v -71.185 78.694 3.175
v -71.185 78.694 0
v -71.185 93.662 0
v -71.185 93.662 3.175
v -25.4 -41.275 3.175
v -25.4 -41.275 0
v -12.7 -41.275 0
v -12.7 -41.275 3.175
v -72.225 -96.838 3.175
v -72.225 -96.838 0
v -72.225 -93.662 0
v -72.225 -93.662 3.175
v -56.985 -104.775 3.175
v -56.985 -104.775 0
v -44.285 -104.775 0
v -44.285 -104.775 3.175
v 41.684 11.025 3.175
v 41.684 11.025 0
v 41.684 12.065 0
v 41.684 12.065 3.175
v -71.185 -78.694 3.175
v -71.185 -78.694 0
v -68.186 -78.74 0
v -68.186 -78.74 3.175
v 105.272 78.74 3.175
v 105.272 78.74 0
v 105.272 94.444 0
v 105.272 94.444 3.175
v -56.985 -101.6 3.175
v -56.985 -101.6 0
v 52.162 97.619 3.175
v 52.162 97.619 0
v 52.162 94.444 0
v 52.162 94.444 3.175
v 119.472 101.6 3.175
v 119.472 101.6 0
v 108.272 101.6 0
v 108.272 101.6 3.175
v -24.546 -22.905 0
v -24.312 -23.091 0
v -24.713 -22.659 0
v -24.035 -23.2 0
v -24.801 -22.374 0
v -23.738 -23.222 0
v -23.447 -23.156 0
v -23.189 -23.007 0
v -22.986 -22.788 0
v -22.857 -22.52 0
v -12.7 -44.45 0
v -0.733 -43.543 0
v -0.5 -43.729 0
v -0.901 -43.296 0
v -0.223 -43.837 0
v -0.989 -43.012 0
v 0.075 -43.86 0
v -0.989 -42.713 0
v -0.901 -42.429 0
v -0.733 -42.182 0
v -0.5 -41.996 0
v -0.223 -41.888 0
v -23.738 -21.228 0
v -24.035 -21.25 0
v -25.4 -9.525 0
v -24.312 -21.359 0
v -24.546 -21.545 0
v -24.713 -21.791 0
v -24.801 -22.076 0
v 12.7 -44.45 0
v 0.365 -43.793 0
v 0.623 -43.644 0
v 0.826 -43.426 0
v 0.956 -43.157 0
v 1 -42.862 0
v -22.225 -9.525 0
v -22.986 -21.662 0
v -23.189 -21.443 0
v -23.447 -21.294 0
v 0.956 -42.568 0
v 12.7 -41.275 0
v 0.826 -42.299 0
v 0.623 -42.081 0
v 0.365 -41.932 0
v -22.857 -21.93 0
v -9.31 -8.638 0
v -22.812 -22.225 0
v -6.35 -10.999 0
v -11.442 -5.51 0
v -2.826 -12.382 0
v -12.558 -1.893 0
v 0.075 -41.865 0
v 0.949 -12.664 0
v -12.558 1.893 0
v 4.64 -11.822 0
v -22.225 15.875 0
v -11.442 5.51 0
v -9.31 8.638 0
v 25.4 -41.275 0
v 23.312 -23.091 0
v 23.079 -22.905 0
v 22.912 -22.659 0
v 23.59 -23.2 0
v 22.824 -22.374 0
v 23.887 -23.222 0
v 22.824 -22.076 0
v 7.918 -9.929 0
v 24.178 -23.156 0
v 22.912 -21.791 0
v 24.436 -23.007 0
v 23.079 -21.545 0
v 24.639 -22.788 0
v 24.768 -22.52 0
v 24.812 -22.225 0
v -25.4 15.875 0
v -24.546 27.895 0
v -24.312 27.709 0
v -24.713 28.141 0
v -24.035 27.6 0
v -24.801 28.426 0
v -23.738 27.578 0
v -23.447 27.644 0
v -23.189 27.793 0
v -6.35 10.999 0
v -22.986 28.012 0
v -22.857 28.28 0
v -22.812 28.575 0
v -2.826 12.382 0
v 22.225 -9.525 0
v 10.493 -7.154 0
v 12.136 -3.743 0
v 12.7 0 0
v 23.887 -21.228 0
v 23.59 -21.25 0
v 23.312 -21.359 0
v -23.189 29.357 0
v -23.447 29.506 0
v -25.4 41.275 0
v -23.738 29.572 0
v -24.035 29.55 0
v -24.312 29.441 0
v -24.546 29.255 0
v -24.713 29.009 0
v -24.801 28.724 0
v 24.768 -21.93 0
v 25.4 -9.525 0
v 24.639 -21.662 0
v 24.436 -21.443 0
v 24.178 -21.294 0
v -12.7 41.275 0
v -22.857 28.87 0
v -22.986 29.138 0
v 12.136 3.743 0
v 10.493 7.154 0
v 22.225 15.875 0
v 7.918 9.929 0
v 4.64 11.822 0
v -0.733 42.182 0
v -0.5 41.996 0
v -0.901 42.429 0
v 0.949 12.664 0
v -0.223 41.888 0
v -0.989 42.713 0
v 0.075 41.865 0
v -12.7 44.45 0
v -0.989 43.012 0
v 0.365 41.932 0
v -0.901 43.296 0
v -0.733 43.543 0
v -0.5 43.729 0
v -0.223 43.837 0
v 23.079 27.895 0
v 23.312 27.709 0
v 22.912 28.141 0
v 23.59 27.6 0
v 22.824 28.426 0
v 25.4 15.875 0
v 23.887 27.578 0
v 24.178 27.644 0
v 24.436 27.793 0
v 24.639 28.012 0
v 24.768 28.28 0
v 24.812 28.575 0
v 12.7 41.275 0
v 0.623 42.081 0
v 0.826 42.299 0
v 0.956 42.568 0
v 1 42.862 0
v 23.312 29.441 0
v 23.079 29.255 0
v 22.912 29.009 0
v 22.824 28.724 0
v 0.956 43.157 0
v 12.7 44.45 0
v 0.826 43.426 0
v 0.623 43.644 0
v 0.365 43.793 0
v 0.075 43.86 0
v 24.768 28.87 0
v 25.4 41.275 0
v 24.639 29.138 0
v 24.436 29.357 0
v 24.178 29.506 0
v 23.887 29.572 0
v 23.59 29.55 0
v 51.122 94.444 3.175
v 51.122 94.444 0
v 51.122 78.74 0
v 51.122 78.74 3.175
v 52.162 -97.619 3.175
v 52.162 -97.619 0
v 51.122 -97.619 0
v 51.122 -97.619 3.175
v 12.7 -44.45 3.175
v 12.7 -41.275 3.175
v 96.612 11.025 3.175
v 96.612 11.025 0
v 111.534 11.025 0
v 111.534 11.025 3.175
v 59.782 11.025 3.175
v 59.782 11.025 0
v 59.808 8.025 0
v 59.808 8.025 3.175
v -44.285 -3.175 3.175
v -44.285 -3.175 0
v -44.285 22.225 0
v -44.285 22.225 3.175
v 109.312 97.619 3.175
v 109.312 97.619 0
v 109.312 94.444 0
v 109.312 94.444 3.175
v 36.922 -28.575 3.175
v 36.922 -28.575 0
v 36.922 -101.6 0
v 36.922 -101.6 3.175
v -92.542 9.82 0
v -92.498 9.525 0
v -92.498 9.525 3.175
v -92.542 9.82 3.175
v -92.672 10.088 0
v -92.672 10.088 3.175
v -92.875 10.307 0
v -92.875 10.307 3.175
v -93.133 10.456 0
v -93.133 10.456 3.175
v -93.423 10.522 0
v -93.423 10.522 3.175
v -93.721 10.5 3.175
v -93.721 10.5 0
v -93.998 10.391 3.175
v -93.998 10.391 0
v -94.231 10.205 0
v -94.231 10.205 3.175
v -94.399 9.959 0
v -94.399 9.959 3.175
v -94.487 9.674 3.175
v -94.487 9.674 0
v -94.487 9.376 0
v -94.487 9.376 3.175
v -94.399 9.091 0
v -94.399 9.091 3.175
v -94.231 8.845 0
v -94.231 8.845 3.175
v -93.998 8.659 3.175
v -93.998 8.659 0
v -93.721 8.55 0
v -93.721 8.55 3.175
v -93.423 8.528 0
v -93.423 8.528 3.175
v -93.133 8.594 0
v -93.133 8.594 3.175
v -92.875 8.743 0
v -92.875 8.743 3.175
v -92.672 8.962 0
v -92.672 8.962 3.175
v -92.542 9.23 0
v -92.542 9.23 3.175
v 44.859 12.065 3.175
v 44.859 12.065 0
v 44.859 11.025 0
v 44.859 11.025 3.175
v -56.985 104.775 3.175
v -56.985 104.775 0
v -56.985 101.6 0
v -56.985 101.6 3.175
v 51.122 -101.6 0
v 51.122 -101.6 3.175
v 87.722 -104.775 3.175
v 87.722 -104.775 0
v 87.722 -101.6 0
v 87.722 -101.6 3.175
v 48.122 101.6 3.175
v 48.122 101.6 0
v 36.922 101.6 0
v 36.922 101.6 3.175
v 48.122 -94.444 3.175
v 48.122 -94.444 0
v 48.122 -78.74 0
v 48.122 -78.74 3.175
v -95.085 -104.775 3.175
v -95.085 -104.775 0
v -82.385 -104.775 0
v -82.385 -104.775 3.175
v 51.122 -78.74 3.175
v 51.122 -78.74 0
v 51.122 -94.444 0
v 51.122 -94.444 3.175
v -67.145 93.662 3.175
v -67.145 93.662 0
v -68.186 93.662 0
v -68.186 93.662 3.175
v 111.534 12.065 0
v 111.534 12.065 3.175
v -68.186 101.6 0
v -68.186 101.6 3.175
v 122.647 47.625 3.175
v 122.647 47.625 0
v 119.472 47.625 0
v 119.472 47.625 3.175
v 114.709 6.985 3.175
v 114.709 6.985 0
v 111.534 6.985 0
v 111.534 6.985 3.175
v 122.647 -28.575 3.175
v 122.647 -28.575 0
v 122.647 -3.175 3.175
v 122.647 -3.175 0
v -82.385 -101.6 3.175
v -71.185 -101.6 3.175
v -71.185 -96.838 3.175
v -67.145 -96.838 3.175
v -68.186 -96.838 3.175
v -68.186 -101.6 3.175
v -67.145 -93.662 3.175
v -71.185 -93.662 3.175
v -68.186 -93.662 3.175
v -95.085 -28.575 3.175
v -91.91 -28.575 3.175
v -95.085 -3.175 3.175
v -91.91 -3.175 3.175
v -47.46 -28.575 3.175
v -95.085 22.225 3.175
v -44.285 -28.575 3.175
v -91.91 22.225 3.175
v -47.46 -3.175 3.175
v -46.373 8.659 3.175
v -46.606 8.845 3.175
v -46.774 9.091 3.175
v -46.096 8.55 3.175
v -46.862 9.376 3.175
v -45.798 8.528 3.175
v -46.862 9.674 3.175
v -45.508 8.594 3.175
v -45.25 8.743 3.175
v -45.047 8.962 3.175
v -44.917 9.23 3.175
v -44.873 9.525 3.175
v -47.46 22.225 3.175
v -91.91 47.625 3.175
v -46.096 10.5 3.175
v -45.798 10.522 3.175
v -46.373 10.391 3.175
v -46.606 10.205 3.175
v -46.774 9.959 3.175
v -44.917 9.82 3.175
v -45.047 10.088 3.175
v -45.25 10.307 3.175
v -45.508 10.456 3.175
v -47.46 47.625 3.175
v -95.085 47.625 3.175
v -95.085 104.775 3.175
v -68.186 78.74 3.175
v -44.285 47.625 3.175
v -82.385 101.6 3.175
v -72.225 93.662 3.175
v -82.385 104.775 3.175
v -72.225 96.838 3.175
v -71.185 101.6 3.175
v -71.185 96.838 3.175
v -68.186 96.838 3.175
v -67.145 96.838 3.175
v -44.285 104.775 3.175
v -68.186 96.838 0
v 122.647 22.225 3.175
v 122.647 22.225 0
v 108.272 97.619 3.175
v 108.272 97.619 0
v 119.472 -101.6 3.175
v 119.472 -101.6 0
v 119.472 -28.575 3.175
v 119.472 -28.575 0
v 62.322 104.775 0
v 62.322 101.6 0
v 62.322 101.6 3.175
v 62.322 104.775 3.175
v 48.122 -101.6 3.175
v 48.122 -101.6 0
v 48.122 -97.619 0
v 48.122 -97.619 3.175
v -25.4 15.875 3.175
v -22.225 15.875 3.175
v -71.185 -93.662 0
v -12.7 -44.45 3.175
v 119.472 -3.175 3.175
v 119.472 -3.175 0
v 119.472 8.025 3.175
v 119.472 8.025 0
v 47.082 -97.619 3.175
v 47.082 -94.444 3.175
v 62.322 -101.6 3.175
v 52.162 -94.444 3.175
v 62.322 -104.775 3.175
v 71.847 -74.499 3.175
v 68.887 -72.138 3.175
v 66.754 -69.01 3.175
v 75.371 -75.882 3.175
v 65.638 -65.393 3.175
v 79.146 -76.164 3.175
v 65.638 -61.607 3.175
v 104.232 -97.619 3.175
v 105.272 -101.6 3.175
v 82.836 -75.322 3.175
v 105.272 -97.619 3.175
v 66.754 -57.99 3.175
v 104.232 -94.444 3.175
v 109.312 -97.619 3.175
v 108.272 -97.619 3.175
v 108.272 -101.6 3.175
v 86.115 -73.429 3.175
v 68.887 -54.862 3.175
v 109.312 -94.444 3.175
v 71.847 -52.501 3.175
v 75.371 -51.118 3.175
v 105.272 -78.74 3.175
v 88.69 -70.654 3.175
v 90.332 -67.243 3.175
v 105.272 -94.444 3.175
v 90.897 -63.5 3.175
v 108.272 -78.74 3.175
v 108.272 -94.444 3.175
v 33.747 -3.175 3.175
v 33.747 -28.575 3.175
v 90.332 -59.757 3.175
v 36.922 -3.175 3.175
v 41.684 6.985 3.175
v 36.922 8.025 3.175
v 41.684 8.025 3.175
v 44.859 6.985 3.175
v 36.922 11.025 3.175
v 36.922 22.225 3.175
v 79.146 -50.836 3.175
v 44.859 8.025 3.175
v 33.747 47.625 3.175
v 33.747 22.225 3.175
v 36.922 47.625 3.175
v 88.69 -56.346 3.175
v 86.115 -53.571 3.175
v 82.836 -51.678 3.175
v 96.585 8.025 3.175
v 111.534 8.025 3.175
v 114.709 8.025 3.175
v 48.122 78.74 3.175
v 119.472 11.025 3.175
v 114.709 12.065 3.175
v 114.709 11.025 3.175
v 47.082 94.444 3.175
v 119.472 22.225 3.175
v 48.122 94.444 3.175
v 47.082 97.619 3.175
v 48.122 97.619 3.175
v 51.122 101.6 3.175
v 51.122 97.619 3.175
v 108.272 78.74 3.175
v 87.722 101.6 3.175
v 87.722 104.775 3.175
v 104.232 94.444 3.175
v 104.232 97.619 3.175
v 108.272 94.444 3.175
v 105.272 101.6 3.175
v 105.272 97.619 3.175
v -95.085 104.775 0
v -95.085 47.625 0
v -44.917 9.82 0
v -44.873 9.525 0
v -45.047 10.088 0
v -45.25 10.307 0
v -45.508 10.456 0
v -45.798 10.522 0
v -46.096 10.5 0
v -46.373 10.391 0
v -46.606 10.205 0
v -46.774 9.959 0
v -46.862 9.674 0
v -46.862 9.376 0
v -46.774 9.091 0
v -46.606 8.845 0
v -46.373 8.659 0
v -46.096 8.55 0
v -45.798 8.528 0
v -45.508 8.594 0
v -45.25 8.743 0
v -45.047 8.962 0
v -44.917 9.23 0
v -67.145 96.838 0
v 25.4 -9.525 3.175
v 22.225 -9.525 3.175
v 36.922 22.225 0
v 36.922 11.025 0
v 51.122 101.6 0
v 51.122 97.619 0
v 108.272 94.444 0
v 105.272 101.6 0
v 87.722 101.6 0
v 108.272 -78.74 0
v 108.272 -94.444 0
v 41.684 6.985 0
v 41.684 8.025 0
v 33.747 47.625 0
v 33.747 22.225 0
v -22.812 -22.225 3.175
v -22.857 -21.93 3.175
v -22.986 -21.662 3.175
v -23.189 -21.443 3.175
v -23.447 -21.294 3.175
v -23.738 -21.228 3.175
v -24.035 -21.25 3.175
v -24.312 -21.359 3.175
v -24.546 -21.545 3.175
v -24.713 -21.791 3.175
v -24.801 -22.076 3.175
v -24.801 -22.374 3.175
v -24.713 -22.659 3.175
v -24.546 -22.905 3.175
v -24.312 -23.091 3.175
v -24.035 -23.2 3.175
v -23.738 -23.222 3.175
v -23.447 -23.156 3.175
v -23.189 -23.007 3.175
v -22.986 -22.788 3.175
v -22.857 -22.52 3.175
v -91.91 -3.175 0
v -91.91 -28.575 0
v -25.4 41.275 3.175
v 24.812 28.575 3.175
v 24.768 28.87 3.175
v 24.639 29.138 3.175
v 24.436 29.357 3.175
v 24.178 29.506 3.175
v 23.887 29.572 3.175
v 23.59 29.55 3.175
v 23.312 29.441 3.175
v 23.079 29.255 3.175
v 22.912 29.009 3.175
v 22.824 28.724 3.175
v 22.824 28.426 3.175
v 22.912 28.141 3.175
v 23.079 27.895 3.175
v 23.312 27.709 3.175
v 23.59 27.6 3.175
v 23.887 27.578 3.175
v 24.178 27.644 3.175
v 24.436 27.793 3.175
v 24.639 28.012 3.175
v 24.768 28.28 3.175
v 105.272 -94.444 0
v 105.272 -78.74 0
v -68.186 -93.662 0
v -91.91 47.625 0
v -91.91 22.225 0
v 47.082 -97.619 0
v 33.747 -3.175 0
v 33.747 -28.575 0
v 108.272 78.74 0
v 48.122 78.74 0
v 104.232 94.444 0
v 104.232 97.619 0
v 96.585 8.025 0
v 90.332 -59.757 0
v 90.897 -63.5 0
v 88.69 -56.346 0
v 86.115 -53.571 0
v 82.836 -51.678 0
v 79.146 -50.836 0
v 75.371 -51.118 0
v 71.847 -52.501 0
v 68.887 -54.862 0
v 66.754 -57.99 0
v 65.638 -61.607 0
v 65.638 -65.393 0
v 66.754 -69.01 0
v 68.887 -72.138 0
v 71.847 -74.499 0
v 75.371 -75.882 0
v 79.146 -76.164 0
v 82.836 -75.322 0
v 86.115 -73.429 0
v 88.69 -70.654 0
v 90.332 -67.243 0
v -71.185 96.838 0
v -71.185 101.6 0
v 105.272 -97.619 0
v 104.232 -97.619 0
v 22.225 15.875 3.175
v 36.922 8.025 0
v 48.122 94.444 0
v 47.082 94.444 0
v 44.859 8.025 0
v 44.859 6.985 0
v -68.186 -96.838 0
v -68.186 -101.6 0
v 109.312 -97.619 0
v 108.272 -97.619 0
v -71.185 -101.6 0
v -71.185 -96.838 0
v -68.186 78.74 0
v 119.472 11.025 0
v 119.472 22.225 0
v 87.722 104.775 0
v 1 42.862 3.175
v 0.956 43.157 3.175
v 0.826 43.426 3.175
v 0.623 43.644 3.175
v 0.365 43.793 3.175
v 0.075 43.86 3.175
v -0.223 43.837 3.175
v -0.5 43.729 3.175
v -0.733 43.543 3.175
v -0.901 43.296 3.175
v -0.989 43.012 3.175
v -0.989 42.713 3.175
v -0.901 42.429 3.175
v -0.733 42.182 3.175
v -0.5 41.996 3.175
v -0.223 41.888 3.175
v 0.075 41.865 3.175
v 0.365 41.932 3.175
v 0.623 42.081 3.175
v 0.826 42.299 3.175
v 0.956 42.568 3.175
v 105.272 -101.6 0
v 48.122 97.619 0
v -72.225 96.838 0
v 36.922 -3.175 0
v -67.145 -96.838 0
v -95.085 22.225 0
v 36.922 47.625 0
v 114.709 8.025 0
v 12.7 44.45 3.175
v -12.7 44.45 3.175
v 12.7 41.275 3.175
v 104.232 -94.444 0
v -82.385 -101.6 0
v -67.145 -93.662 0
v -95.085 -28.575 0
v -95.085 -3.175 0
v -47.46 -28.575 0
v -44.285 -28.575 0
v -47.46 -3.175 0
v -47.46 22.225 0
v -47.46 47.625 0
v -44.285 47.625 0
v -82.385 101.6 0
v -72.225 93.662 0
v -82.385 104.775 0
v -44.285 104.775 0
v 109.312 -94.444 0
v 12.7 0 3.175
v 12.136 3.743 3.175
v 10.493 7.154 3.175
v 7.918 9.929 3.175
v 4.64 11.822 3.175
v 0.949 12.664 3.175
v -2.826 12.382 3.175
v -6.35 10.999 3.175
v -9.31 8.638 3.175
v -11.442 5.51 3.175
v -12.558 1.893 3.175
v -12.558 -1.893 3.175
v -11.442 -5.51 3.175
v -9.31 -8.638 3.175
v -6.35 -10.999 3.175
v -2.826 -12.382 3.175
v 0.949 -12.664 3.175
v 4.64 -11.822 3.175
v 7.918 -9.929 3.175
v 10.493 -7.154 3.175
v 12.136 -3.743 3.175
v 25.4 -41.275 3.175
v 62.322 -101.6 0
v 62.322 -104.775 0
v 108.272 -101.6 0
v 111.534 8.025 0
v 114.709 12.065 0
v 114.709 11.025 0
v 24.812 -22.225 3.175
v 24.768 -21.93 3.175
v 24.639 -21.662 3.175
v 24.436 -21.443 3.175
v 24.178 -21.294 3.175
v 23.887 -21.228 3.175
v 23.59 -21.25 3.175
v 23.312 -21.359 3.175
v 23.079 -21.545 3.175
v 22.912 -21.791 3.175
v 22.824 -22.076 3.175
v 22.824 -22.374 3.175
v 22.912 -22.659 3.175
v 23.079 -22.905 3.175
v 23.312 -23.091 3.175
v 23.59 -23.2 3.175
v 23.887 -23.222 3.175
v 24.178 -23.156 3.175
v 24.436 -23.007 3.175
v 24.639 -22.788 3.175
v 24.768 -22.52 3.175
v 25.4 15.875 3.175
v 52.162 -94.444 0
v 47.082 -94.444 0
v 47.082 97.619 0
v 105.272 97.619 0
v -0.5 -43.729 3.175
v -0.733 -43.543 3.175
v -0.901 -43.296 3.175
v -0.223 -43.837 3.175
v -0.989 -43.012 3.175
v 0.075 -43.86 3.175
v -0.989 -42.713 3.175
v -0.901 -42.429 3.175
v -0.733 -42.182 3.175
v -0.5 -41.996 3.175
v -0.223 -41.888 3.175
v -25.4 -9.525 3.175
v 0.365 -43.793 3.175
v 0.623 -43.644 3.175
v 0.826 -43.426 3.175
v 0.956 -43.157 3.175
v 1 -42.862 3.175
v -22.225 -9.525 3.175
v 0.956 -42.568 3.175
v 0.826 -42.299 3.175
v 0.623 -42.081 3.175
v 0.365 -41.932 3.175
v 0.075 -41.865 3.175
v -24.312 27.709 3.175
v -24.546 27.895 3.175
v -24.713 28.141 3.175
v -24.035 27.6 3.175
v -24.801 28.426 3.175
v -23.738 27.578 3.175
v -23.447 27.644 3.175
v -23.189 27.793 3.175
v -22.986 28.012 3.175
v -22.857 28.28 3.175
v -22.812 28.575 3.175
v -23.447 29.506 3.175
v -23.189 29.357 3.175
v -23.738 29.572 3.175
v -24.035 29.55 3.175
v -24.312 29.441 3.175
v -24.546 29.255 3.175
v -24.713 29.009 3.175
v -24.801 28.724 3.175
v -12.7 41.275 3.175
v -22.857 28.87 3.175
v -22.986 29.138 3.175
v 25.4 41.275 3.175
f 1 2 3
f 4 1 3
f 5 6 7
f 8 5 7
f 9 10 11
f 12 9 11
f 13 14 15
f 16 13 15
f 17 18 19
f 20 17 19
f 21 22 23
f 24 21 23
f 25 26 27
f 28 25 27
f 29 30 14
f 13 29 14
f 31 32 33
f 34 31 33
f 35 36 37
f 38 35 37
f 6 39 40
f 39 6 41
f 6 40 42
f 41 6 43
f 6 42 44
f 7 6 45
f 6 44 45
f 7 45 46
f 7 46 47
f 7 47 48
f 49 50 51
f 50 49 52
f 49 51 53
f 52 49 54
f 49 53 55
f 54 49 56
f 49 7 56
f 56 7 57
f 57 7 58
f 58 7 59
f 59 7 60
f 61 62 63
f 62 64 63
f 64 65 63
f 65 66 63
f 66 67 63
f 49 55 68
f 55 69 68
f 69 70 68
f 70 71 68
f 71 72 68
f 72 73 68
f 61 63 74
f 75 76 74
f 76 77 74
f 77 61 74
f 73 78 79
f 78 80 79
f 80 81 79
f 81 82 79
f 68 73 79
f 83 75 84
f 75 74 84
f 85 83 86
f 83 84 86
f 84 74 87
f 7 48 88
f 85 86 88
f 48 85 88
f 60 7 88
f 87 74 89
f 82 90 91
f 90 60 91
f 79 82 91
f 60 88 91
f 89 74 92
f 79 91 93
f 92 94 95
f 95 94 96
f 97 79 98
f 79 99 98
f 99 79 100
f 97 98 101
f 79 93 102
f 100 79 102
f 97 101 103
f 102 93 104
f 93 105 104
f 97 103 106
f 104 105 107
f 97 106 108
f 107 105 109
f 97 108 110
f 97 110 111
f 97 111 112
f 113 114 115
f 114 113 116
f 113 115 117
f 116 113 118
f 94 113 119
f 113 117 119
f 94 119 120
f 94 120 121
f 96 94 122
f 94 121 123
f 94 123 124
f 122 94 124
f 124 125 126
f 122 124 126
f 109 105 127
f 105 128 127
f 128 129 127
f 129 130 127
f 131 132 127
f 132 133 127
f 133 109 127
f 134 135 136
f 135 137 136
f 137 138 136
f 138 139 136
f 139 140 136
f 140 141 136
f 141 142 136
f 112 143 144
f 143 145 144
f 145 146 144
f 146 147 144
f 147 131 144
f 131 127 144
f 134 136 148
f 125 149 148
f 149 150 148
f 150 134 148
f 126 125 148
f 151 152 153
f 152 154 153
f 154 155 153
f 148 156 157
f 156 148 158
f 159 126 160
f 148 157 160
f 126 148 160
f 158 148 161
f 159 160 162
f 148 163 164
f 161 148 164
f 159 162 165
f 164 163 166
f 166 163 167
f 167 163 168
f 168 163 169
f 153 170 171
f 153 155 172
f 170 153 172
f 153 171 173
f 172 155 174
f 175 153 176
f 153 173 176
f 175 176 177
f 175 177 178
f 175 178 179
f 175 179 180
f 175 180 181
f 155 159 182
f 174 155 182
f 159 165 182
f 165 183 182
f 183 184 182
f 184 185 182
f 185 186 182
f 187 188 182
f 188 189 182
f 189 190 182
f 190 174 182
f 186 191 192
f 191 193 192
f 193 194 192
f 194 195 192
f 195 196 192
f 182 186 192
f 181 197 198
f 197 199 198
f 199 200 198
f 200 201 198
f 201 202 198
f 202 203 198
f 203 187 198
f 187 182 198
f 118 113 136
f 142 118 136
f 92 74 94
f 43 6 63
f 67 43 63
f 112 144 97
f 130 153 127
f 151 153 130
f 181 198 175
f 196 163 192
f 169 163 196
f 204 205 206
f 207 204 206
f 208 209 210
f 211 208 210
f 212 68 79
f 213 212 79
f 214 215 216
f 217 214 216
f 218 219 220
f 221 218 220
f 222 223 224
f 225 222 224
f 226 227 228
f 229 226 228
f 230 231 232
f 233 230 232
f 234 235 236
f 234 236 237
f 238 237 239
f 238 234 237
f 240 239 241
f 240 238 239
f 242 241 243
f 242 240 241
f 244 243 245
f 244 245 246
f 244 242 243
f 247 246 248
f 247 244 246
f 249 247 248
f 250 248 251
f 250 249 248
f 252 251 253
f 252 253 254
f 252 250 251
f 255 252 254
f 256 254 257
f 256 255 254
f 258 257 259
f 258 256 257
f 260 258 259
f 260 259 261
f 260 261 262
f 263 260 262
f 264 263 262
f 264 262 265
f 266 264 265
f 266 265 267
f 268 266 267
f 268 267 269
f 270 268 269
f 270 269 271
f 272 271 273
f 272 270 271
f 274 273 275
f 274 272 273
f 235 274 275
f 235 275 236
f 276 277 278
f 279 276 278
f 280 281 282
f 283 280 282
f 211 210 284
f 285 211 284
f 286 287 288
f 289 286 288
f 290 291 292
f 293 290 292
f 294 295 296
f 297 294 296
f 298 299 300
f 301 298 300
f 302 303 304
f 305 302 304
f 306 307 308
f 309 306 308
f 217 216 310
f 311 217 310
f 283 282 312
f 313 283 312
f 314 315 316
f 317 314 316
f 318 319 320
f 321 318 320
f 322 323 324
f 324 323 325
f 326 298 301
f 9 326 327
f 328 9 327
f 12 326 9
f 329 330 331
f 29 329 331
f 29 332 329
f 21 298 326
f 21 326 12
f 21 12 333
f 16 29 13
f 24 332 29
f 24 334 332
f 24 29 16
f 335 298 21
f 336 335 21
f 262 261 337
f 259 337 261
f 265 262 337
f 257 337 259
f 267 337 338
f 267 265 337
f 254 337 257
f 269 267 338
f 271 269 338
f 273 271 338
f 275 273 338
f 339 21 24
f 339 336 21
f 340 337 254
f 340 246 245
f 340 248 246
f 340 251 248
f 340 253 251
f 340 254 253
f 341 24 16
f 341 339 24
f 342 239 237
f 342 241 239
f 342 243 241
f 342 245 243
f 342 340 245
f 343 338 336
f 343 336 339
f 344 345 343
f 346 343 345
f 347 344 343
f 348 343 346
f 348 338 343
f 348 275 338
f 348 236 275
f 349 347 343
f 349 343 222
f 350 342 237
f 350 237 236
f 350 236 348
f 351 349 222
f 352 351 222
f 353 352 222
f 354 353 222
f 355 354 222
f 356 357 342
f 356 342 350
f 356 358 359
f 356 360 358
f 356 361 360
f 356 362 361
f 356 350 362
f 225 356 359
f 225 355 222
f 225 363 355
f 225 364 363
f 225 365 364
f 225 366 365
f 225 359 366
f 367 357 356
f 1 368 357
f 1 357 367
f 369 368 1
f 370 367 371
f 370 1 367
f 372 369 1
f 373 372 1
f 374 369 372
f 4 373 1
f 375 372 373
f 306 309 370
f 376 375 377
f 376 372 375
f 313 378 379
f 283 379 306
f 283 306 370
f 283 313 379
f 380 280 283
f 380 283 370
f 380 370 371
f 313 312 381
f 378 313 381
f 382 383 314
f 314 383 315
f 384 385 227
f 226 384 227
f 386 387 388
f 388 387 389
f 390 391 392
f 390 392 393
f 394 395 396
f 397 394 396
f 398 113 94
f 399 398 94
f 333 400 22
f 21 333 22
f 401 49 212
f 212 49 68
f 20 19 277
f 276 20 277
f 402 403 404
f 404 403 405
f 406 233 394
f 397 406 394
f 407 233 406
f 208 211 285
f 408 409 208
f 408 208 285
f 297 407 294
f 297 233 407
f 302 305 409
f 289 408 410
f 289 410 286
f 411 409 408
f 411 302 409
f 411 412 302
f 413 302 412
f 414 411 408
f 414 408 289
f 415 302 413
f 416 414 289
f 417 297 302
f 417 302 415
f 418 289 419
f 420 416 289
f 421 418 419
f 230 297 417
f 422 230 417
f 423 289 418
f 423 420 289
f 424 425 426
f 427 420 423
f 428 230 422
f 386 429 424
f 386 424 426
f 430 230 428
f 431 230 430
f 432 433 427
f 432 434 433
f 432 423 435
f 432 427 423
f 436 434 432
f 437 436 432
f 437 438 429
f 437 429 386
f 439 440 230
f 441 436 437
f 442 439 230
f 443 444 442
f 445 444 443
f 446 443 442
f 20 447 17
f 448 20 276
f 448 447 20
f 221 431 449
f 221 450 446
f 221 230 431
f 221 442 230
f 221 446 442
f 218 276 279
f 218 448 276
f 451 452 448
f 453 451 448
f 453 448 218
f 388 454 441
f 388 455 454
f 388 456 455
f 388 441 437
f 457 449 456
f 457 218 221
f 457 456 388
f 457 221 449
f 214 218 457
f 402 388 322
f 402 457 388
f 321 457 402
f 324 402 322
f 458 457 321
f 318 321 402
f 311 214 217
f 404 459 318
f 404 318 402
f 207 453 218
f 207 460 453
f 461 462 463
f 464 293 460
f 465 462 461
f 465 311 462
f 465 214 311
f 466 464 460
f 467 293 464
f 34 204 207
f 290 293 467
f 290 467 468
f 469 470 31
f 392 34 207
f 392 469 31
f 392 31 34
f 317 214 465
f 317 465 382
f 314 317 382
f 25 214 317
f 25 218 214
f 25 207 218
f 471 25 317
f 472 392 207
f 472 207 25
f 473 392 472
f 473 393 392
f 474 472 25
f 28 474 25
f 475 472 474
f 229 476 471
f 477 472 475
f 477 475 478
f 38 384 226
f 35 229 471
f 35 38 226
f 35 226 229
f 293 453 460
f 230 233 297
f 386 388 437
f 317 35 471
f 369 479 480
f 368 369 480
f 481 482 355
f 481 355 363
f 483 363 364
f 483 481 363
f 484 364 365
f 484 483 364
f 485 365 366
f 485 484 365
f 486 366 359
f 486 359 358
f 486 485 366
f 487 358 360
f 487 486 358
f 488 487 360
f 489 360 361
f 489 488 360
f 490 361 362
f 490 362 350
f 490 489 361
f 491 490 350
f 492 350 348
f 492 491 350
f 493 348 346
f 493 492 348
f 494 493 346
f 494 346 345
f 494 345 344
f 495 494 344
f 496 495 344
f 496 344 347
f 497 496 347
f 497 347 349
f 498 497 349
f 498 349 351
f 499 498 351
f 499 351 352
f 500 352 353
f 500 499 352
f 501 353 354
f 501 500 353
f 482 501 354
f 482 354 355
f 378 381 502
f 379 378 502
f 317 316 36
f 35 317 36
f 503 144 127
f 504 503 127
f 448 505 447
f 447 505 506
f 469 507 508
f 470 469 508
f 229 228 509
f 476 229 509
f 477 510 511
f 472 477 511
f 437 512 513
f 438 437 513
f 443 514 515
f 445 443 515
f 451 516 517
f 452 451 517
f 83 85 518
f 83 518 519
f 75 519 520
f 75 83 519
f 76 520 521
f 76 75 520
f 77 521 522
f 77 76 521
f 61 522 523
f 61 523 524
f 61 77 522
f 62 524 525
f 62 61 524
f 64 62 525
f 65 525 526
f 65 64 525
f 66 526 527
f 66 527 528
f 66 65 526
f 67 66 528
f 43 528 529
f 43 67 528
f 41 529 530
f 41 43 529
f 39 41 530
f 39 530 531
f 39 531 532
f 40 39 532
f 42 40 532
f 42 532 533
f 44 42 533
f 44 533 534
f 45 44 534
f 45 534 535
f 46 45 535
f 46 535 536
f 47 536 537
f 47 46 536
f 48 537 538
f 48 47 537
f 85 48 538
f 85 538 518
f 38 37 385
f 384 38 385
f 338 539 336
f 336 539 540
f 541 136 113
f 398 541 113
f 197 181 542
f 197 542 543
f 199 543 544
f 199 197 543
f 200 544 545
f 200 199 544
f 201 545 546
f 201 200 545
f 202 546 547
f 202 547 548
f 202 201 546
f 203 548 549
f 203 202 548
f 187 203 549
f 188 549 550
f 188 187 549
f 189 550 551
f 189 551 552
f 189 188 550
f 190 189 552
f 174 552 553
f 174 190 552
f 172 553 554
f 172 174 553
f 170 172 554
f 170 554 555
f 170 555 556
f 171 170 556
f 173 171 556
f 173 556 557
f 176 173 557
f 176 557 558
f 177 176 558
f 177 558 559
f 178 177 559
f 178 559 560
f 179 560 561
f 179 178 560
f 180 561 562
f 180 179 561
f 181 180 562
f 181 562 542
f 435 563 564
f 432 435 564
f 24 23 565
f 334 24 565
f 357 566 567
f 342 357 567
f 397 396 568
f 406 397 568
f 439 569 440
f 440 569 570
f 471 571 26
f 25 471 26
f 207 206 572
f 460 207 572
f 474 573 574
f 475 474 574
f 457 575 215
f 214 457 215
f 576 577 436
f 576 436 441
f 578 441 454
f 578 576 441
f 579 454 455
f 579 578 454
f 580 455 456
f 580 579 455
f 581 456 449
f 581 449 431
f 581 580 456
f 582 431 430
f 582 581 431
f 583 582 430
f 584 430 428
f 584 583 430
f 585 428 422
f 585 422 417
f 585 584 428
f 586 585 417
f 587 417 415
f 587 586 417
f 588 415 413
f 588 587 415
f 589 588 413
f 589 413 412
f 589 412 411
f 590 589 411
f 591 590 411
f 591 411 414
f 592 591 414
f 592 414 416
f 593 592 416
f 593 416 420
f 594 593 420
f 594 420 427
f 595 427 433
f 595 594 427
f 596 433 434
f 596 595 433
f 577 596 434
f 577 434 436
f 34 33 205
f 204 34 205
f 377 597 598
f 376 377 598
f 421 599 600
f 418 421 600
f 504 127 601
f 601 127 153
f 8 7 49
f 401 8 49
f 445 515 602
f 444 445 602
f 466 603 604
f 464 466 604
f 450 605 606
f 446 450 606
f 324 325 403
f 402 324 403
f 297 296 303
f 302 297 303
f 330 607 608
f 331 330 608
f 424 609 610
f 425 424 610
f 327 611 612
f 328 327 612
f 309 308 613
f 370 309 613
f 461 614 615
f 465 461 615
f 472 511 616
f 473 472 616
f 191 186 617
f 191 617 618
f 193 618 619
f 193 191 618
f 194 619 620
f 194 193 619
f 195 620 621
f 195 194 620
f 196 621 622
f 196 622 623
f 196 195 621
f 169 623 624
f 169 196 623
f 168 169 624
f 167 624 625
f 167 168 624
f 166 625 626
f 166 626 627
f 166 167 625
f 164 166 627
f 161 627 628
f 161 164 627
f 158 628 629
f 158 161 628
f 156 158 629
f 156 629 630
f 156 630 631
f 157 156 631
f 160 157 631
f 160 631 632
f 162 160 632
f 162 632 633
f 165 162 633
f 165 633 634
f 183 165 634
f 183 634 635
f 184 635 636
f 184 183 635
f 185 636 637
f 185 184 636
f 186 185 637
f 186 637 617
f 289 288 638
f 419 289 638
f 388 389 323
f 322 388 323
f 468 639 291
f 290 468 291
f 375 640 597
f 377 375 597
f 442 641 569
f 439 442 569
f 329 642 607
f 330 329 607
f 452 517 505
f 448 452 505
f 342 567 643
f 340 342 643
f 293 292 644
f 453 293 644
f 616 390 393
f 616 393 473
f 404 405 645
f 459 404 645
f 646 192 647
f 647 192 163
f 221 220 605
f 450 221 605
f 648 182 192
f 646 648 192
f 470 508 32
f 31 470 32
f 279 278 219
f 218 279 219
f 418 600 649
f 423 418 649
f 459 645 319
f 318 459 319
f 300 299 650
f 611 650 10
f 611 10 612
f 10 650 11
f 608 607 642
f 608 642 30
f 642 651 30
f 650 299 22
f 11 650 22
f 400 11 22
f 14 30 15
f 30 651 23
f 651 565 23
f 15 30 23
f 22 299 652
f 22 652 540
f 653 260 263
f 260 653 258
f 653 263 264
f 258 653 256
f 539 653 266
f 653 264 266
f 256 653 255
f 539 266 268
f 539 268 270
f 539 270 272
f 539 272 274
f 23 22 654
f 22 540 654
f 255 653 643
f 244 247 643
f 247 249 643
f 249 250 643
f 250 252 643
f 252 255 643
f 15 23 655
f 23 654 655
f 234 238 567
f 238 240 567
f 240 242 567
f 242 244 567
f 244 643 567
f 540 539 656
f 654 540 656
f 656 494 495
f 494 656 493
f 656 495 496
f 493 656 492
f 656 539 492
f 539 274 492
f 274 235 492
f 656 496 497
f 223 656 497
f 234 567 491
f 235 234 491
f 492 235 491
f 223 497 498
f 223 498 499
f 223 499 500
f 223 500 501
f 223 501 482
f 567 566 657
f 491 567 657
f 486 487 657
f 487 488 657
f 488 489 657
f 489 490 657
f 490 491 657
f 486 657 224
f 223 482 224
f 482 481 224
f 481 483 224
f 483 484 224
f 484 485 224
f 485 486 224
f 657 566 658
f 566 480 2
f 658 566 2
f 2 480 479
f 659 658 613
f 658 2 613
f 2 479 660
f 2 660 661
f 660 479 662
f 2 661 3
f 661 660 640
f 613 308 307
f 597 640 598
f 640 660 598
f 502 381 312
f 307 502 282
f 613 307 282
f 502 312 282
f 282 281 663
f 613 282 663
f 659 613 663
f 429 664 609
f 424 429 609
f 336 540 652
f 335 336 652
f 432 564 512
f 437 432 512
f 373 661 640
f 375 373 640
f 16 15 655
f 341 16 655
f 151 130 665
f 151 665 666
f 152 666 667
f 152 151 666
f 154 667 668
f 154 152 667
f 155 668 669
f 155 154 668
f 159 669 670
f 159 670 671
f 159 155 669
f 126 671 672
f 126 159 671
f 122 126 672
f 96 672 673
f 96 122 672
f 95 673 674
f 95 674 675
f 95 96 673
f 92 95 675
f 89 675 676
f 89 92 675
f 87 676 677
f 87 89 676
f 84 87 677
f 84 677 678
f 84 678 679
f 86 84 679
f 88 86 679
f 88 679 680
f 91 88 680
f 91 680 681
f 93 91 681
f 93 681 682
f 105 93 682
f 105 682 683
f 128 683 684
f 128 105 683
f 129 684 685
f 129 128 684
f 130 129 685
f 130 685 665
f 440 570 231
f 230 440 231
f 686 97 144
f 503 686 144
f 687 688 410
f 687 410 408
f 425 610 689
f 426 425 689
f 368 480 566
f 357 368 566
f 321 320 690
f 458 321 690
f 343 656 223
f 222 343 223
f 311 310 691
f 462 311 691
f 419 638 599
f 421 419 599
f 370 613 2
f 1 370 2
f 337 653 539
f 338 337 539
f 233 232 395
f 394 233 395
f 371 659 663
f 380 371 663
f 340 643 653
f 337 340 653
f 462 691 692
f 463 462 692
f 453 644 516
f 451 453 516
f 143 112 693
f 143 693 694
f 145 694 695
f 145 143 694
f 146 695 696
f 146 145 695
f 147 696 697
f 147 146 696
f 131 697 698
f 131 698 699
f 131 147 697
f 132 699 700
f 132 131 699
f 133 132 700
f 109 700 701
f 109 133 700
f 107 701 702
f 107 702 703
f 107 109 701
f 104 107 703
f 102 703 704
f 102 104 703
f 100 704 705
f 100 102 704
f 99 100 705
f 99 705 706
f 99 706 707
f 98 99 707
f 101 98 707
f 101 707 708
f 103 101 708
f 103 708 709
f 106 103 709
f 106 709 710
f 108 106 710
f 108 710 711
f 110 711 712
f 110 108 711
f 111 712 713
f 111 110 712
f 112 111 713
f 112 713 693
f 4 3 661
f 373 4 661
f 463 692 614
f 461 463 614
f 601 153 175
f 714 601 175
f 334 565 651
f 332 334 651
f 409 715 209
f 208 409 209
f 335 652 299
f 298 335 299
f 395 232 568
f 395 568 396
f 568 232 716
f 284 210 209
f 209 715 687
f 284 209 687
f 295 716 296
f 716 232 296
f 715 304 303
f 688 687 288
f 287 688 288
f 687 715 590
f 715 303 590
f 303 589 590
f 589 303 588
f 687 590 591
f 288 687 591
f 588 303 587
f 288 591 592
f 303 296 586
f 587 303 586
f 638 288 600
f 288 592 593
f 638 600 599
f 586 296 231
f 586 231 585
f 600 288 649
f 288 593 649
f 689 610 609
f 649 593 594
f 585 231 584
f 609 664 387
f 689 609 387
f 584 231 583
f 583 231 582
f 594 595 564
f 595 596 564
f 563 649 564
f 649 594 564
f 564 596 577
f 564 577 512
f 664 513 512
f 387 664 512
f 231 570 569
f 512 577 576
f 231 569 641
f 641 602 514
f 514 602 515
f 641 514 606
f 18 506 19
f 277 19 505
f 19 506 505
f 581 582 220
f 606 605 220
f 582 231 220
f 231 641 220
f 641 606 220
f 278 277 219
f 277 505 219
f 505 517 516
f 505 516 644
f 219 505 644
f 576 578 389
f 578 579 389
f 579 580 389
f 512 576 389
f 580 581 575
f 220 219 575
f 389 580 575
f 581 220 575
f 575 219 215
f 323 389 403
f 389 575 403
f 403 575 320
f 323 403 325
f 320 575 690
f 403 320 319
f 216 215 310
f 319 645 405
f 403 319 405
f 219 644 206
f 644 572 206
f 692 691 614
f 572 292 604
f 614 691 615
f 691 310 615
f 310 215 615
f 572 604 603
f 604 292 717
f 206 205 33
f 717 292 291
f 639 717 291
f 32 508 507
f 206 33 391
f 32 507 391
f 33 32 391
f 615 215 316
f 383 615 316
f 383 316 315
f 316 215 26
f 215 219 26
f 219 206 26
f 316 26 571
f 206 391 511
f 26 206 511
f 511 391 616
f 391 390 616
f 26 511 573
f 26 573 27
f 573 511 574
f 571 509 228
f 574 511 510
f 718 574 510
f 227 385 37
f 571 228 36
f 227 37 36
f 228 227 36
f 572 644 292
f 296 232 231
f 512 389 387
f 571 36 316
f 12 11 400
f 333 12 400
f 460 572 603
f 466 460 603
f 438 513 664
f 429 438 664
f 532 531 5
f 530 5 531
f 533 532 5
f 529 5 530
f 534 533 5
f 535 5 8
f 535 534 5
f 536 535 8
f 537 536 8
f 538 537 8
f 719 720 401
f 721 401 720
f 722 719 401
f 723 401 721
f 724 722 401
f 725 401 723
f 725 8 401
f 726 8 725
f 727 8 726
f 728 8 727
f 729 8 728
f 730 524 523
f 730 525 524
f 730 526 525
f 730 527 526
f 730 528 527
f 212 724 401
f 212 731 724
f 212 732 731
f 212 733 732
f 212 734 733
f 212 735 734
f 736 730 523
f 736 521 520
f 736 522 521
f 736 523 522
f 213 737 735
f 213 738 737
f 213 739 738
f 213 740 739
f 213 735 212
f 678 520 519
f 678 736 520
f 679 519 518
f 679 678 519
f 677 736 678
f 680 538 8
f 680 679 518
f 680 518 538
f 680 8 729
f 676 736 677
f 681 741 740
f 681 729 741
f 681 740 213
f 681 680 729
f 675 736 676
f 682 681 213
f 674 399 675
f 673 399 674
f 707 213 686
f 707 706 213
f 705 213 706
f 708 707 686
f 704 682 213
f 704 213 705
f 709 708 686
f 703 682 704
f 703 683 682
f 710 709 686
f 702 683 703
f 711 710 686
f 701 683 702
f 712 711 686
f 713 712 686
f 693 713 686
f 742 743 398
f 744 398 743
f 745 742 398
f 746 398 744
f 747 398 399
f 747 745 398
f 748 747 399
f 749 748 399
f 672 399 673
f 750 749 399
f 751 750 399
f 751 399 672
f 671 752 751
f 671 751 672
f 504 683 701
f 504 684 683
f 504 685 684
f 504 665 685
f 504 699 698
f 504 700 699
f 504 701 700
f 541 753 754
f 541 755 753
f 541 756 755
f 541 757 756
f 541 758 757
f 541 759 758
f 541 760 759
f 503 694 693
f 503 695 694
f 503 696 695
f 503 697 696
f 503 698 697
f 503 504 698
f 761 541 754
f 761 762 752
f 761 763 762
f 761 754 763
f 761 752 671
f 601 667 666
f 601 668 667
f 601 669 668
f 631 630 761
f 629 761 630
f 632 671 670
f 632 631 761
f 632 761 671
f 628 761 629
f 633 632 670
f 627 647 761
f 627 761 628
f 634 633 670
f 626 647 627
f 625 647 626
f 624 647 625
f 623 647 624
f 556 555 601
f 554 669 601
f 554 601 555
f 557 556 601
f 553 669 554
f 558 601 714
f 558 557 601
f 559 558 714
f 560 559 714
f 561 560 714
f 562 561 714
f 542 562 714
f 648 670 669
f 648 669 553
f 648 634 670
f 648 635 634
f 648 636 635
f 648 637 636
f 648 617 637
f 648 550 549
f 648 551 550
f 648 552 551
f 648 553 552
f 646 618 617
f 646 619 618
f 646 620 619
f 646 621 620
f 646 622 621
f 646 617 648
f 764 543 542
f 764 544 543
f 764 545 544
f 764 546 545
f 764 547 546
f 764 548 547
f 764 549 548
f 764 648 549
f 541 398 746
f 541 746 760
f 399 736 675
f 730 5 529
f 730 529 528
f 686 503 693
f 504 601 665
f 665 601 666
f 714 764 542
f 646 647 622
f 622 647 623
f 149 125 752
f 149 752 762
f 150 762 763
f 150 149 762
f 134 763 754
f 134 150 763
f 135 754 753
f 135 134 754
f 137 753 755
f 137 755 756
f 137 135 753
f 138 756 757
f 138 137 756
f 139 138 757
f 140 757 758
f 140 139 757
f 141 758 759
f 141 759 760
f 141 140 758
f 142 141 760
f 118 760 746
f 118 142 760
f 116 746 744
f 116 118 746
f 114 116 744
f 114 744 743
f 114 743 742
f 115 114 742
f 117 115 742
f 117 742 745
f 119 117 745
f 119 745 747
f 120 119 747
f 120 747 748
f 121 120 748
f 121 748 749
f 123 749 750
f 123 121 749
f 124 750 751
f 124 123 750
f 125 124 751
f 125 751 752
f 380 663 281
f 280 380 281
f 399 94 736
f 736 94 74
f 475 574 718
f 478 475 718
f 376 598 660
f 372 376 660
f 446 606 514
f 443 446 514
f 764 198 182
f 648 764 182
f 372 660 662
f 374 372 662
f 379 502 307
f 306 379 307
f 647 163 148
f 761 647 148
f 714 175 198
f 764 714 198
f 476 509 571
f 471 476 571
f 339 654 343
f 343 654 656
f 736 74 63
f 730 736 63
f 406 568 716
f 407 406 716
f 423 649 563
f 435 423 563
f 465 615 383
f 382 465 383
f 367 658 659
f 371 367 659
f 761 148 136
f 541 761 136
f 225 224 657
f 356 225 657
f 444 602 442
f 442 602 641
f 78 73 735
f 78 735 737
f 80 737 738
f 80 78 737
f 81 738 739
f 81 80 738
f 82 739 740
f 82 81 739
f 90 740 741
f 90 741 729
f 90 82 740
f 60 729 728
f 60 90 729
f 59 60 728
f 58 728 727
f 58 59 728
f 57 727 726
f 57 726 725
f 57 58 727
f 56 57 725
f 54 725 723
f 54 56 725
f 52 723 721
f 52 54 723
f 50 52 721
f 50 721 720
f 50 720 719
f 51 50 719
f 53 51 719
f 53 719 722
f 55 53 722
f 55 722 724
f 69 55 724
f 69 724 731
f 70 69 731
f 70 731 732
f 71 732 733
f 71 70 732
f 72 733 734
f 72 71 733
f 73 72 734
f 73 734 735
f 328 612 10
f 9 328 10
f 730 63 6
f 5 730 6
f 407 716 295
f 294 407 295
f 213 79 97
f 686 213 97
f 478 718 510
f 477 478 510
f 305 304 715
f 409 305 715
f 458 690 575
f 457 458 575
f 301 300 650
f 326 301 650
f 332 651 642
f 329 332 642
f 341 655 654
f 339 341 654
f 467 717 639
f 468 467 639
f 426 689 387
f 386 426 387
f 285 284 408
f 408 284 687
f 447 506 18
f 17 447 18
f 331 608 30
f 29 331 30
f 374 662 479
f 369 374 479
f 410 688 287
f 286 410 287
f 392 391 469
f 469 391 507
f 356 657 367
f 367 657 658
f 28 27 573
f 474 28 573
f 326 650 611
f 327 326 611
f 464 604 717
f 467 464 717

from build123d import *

# Parameters (mm, degrees)
F0_R     = 1
F0_R_2   = 12.7
F2_DEPTH = 3.175
F1_R     = 1
F3_DEPTH = 3.175
F4_R     = 12.7
F4_W     = 25.4
F4_H     = 3.175
F5_DEPTH = 3.175


# Not quite as in the source:
# - a length typed as a fraction of an inch, garbled in the dataset ("3 / 203.2 mm" for 3/8 in), is restored


with BuildPart() as f2:
    # F0 (on Top) → F2 (new body)
    with BuildSketch(Plane.XY):
        Polygon((-12.7, 41.275), (-22.225, 41.275), (-25.4, 41.275), (-25.4, 15.875), (-22.225, 15.875), (-22.225, -9.525), (-25.4, -9.525), (-25.4, -34.925), (-25.4, -41.275), (-22.225, -41.275), (-12.7, -41.275), (-12.7, -44.45), (12.7, -44.45), (12.7, -41.275), (22.225, -41.275), (25.4, -41.275), (25.4, -34.925), (25.4, -9.525), (22.225, -9.525), (22.225, 15.875), (25.4, 15.875), (25.4, 41.275), (22.225, 41.275), (12.7, 41.275), (12.7, 44.45), (-12.7, 44.45), align=None)
        with Locations((0, -42.8625)):
            Circle(F0_R, mode=Mode.SUBTRACT)
        with Locations((-23.8125, -22.225)):
            Circle(F0_R, mode=Mode.SUBTRACT)
        with Locations((23.8125, -22.225)):
            Circle(F0_R, mode=Mode.SUBTRACT)
        Circle(F0_R_2, mode=Mode.SUBTRACT)
        with Locations((-23.8125, 28.575)):
            Circle(F0_R, mode=Mode.SUBTRACT)
        with Locations((0, 42.8625)):
            Circle(F0_R, mode=Mode.SUBTRACT)
        with Locations((23.8125, 28.575)):
            Circle(F0_R, mode=Mode.SUBTRACT)
    extrude(amount=F2_DEPTH)


with BuildPart() as f3:
    # F1 (on Top) → F3 (new body)
    with BuildSketch(Plane.XY):
        Polygon((-71.1853192556, 101.6), (-82.385493889, 101.6), (-82.385493889, 104.775), (-95.085493889, 104.775), (-95.085493889, 101.6), (-95.085493889, 47.625), (-91.910493889, 47.625), (-91.910493889, 22.225), (-95.085493889, 22.225), (-95.085493889, -3.175), (-91.910493889, -3.175), (-91.910493889, -28.575), (-95.085493889, -28.575), (-95.085493889, -101.6), (-95.085493889, -104.775), (-82.385493889, -104.775), (-82.385493889, -101.6), (-71.1853192556, -101.6), (-71.1853192556, -96.8375), (-72.225493889, -96.8375), (-72.225493889, -93.6625), (-71.1853192556, -93.6625), (-71.1853192556, -78.6942235994), (-68.1856685224, -78.74), (-68.1856685224, -93.6625), (-67.145493889, -93.6625), (-67.145493889, -96.8375), (-68.1856685224, -96.8375), (-68.1856685224, -101.6), (-56.985493889, -101.6), (-56.985493889, -104.775), (-44.285493889, -104.775), (-44.285493889, -101.6), (-44.285493889, -28.575), (-47.460493889, -28.575), (-47.460493889, -3.175), (-44.285493889, -3.175), (-44.285493889, 22.225), (-47.460493889, 22.225), (-47.460493889, 47.625), (-44.285493889, 47.625), (-44.285493889, 101.6), (-44.285493889, 104.775), (-56.985493889, 104.775), (-56.985493889, 101.6), (-68.1856685224, 101.6), (-68.1856685224, 96.8375), (-67.145493889, 96.8375), (-67.145493889, 93.6625), (-68.1856685224, 93.6625), (-68.1856685224, 78.74), (-71.1853192556, 78.6942235994), (-71.1853192556, 93.6625), (-72.225493889, 93.6625), (-72.225493889, 96.8375), (-71.1853192556, 96.8375), align=None)
        with Locations((-93.497993889, 9.525)):
            Circle(F1_R, mode=Mode.SUBTRACT)
        with Locations((-45.872993889, 9.525)):
            Circle(F1_R, mode=Mode.SUBTRACT)
    extrude(amount=F3_DEPTH)


with BuildPart() as f5:
    # F4 (on Top) → F5 (new body)
    with BuildSketch(Plane.XY):
        Polygon((48.1215686488, 101.6), (36.9215686488, 101.6), (36.9215686488, 47.625), (33.7465686488, 47.625), (33.7465686488, 22.225), (36.9215686488, 22.225), (36.9215686488, 11.0249418534), (41.6840686488, 11.0249418534), (41.6840686488, 12.065), (44.8590686488, 12.065), (44.8590686488, 11.0249418534), (59.7815686488, 11.0249418534), (59.8079835334, 8.0250581466), (44.8590686488, 8.0250581466), (44.8590686488, 6.985), (41.6840686488, 6.985), (41.6840686488, 8.0250581466), (36.9215686488, 8.0250581466), (36.9215686488, -3.175), (33.7465686488, -3.175), (33.7465686488, -28.575), (36.9215686488, -28.575), (36.9215686488, -101.6), (48.1215686488, -101.6), (48.1215686488, -97.6185846567), (47.0815686488, -97.6185846567), (47.0815686488, -94.4435846567), (48.1215686488, -94.4435846567), (48.1215686488, -78.74), (51.1215686488, -78.74), (51.1215686488, -94.4435846567), (52.1615686488, -94.4435846567), (52.1615686488, -97.6185846567), (51.1215686488, -97.6185846567), (51.1215686488, -101.6), (62.3215686488, -101.6), (87.7215686488, -101.6), (105.2715686488, -101.6), (105.2715686488, -97.6185846567), (104.2315686488, -97.6185846567), (104.2315686488, -94.4435846567), (105.2715686488, -94.4435846567), (105.2715686488, -78.74), (108.2715686488, -78.74), (108.2715686488, -94.4435846567), (109.3115686488, -94.4435846567), (109.3115686488, -97.6185846567), (108.2715686488, -97.6185846567), (108.2715686488, -101.6), (119.4715686488, -101.6), (119.4715686488, -28.575), (122.6465686488, -28.575), (122.6465686488, -3.175), (119.4715686488, -3.175), (119.4715686488, 8.0250581466), (114.7090686488, 8.0250581466), (114.7090686488, 6.985), (111.5340686488, 6.985), (111.5340686488, 8.0250581466), (96.585153764, 8.0250581466), (96.6115686488, 11.0249418534), (111.5340686488, 11.0249418534), (111.5340686488, 12.065), (114.7090686488, 12.065), (114.7090686488, 11.0249418534), (119.4715686488, 11.0249418534), (119.4715686488, 22.225), (122.6465686488, 22.225), (122.6465686488, 47.625), (119.4715686488, 47.625), (119.4715686488, 101.6), (108.2715686488, 101.6), (108.2715686488, 97.6185846567), (109.3115686488, 97.6185846567), (109.3115686488, 94.4435846567), (108.2715686488, 94.4435846567), (108.2715686488, 78.74), (105.2715686488, 78.74), (105.2715686488, 94.4435846567), (104.2315686488, 94.4435846567), (104.2315686488, 97.6185846567), (105.2715686488, 97.6185846567), (105.2715686488, 101.6), (87.7215686488, 101.6), (62.3215686488, 101.6), (51.1215686488, 101.6), (51.1215686488, 97.6185846567), (52.1615686488, 97.6185846567), (52.1615686488, 94.4435846567), (51.1215686488, 94.4435846567), (51.1215686488, 78.74), (48.1215686488, 78.74), (48.1215686488, 94.4435846567), (47.0815686488, 94.4435846567), (47.0815686488, 97.6185846567), (48.1215686488, 97.6185846567), align=None)
        with Locations((78.1965686488, -63.5)):
            Circle(F4_R, mode=Mode.SUBTRACT)
        with Locations((75.0215686488, -103.1875)):
            Rectangle(F4_W, F4_H)
        with Locations((75.0215686488, 103.1875)):
            Rectangle(F4_W, F4_H)
    extrude(amount=F5_DEPTH)


solid = Compound([f2.part, f3.part, f5.part])
